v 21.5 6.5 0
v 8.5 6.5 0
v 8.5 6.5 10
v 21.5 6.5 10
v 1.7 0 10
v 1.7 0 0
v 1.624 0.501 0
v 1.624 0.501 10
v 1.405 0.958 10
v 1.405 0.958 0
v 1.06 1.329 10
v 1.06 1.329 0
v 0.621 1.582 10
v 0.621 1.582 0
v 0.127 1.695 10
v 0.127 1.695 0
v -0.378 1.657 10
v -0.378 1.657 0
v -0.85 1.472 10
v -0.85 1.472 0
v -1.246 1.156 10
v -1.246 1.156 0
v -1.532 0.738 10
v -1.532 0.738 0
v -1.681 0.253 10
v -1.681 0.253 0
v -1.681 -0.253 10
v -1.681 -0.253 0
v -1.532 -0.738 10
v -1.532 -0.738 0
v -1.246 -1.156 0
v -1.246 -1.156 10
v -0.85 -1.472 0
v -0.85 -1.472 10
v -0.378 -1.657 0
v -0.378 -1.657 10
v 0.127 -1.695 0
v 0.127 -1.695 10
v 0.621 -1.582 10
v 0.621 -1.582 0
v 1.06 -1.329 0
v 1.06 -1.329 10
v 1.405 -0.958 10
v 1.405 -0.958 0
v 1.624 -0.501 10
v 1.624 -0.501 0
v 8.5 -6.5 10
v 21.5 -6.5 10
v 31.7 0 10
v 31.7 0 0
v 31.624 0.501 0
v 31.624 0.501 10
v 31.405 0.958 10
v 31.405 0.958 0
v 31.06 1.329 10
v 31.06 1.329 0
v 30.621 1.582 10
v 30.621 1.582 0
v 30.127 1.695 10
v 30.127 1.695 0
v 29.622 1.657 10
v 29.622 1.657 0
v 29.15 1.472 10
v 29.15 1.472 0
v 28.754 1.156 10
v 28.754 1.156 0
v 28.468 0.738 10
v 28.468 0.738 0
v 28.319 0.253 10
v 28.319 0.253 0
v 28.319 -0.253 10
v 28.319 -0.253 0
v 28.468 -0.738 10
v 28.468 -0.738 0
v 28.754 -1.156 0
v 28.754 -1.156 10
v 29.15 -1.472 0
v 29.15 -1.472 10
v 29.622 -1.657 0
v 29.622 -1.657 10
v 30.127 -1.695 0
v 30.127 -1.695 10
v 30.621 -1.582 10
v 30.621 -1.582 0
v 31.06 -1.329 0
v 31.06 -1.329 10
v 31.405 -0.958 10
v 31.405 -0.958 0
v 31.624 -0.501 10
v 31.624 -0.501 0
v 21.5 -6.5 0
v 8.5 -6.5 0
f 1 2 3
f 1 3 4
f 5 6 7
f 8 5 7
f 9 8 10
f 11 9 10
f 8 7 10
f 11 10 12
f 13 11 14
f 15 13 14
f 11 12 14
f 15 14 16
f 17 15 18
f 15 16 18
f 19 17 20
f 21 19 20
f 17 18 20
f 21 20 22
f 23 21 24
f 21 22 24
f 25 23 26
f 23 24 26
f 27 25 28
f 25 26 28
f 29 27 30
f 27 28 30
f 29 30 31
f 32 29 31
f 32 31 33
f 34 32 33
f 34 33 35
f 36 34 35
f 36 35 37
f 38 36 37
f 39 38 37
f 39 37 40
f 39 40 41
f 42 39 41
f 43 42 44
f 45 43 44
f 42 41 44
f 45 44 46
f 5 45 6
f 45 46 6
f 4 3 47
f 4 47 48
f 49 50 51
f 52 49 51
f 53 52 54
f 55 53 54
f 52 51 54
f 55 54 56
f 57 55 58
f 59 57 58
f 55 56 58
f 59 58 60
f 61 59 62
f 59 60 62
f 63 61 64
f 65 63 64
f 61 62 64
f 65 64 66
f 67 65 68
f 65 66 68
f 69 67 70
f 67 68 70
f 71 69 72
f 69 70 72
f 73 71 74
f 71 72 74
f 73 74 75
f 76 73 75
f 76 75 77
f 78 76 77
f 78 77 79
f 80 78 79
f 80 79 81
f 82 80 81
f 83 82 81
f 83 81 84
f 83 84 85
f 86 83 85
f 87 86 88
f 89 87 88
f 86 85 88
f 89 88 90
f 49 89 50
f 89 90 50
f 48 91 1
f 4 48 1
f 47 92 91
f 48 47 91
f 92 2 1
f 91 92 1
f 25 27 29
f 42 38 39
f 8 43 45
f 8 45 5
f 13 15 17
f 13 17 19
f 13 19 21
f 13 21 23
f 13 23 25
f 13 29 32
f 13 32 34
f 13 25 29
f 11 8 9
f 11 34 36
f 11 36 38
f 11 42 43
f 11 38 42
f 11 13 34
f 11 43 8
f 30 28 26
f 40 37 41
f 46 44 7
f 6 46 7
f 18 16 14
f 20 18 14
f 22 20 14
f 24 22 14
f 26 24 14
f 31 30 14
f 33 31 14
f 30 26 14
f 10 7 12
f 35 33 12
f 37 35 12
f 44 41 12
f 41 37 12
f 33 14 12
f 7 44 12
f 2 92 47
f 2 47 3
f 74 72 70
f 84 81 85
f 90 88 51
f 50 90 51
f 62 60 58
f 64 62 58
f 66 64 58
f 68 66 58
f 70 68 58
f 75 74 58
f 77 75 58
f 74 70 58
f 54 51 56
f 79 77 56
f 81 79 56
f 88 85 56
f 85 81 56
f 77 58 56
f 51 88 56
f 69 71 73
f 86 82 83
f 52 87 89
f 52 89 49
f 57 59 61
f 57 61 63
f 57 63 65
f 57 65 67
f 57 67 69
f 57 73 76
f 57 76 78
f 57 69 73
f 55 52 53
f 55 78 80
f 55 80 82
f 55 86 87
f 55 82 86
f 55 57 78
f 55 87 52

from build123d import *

# Parameters (mm, degrees)
CYLINDER007_R     = 1.7
CYLINDER007_DEPTH = 10
BOX009_W          = 13
BOX009_H          = 13
BOX009_DEPTH      = 10
CYLINDER008_R     = 1.7
CYLINDER008_DEPTH = 10


with BuildPart() as cylinder007:
    # Cylinder007 → Cylinder007 (new body)
    with BuildSketch(Plane.XY):
        Circle(CYLINDER007_R)
    extrude(amount=CYLINDER007_DEPTH)


with BuildPart() as box009:
    # Box009 → Box009 (new body)
    with BuildSketch(Plane(origin=(8.5, -6.5, 0), x_dir=(1, 0, 0), z_dir=(0, 0, 1))):
        with Locations((6.5, 6.5)):
            Rectangle(BOX009_W, BOX009_H)
    extrude(amount=BOX009_DEPTH)


with BuildPart() as usb_type_b:
    # Cylinder008 → Cylinder008 (new body)
    with BuildSketch(Plane(origin=(30, 0, 0), x_dir=(1, 0, 0), z_dir=(0, 0, 1))):
        Circle(CYLINDER008_R)
    extrude(amount=CYLINDER008_DEPTH)

    # Fusion019002003: union Cylinder007, Box009
    add(cylinder007.part)
    add(box009.part)


solid = usb_type_b.part
